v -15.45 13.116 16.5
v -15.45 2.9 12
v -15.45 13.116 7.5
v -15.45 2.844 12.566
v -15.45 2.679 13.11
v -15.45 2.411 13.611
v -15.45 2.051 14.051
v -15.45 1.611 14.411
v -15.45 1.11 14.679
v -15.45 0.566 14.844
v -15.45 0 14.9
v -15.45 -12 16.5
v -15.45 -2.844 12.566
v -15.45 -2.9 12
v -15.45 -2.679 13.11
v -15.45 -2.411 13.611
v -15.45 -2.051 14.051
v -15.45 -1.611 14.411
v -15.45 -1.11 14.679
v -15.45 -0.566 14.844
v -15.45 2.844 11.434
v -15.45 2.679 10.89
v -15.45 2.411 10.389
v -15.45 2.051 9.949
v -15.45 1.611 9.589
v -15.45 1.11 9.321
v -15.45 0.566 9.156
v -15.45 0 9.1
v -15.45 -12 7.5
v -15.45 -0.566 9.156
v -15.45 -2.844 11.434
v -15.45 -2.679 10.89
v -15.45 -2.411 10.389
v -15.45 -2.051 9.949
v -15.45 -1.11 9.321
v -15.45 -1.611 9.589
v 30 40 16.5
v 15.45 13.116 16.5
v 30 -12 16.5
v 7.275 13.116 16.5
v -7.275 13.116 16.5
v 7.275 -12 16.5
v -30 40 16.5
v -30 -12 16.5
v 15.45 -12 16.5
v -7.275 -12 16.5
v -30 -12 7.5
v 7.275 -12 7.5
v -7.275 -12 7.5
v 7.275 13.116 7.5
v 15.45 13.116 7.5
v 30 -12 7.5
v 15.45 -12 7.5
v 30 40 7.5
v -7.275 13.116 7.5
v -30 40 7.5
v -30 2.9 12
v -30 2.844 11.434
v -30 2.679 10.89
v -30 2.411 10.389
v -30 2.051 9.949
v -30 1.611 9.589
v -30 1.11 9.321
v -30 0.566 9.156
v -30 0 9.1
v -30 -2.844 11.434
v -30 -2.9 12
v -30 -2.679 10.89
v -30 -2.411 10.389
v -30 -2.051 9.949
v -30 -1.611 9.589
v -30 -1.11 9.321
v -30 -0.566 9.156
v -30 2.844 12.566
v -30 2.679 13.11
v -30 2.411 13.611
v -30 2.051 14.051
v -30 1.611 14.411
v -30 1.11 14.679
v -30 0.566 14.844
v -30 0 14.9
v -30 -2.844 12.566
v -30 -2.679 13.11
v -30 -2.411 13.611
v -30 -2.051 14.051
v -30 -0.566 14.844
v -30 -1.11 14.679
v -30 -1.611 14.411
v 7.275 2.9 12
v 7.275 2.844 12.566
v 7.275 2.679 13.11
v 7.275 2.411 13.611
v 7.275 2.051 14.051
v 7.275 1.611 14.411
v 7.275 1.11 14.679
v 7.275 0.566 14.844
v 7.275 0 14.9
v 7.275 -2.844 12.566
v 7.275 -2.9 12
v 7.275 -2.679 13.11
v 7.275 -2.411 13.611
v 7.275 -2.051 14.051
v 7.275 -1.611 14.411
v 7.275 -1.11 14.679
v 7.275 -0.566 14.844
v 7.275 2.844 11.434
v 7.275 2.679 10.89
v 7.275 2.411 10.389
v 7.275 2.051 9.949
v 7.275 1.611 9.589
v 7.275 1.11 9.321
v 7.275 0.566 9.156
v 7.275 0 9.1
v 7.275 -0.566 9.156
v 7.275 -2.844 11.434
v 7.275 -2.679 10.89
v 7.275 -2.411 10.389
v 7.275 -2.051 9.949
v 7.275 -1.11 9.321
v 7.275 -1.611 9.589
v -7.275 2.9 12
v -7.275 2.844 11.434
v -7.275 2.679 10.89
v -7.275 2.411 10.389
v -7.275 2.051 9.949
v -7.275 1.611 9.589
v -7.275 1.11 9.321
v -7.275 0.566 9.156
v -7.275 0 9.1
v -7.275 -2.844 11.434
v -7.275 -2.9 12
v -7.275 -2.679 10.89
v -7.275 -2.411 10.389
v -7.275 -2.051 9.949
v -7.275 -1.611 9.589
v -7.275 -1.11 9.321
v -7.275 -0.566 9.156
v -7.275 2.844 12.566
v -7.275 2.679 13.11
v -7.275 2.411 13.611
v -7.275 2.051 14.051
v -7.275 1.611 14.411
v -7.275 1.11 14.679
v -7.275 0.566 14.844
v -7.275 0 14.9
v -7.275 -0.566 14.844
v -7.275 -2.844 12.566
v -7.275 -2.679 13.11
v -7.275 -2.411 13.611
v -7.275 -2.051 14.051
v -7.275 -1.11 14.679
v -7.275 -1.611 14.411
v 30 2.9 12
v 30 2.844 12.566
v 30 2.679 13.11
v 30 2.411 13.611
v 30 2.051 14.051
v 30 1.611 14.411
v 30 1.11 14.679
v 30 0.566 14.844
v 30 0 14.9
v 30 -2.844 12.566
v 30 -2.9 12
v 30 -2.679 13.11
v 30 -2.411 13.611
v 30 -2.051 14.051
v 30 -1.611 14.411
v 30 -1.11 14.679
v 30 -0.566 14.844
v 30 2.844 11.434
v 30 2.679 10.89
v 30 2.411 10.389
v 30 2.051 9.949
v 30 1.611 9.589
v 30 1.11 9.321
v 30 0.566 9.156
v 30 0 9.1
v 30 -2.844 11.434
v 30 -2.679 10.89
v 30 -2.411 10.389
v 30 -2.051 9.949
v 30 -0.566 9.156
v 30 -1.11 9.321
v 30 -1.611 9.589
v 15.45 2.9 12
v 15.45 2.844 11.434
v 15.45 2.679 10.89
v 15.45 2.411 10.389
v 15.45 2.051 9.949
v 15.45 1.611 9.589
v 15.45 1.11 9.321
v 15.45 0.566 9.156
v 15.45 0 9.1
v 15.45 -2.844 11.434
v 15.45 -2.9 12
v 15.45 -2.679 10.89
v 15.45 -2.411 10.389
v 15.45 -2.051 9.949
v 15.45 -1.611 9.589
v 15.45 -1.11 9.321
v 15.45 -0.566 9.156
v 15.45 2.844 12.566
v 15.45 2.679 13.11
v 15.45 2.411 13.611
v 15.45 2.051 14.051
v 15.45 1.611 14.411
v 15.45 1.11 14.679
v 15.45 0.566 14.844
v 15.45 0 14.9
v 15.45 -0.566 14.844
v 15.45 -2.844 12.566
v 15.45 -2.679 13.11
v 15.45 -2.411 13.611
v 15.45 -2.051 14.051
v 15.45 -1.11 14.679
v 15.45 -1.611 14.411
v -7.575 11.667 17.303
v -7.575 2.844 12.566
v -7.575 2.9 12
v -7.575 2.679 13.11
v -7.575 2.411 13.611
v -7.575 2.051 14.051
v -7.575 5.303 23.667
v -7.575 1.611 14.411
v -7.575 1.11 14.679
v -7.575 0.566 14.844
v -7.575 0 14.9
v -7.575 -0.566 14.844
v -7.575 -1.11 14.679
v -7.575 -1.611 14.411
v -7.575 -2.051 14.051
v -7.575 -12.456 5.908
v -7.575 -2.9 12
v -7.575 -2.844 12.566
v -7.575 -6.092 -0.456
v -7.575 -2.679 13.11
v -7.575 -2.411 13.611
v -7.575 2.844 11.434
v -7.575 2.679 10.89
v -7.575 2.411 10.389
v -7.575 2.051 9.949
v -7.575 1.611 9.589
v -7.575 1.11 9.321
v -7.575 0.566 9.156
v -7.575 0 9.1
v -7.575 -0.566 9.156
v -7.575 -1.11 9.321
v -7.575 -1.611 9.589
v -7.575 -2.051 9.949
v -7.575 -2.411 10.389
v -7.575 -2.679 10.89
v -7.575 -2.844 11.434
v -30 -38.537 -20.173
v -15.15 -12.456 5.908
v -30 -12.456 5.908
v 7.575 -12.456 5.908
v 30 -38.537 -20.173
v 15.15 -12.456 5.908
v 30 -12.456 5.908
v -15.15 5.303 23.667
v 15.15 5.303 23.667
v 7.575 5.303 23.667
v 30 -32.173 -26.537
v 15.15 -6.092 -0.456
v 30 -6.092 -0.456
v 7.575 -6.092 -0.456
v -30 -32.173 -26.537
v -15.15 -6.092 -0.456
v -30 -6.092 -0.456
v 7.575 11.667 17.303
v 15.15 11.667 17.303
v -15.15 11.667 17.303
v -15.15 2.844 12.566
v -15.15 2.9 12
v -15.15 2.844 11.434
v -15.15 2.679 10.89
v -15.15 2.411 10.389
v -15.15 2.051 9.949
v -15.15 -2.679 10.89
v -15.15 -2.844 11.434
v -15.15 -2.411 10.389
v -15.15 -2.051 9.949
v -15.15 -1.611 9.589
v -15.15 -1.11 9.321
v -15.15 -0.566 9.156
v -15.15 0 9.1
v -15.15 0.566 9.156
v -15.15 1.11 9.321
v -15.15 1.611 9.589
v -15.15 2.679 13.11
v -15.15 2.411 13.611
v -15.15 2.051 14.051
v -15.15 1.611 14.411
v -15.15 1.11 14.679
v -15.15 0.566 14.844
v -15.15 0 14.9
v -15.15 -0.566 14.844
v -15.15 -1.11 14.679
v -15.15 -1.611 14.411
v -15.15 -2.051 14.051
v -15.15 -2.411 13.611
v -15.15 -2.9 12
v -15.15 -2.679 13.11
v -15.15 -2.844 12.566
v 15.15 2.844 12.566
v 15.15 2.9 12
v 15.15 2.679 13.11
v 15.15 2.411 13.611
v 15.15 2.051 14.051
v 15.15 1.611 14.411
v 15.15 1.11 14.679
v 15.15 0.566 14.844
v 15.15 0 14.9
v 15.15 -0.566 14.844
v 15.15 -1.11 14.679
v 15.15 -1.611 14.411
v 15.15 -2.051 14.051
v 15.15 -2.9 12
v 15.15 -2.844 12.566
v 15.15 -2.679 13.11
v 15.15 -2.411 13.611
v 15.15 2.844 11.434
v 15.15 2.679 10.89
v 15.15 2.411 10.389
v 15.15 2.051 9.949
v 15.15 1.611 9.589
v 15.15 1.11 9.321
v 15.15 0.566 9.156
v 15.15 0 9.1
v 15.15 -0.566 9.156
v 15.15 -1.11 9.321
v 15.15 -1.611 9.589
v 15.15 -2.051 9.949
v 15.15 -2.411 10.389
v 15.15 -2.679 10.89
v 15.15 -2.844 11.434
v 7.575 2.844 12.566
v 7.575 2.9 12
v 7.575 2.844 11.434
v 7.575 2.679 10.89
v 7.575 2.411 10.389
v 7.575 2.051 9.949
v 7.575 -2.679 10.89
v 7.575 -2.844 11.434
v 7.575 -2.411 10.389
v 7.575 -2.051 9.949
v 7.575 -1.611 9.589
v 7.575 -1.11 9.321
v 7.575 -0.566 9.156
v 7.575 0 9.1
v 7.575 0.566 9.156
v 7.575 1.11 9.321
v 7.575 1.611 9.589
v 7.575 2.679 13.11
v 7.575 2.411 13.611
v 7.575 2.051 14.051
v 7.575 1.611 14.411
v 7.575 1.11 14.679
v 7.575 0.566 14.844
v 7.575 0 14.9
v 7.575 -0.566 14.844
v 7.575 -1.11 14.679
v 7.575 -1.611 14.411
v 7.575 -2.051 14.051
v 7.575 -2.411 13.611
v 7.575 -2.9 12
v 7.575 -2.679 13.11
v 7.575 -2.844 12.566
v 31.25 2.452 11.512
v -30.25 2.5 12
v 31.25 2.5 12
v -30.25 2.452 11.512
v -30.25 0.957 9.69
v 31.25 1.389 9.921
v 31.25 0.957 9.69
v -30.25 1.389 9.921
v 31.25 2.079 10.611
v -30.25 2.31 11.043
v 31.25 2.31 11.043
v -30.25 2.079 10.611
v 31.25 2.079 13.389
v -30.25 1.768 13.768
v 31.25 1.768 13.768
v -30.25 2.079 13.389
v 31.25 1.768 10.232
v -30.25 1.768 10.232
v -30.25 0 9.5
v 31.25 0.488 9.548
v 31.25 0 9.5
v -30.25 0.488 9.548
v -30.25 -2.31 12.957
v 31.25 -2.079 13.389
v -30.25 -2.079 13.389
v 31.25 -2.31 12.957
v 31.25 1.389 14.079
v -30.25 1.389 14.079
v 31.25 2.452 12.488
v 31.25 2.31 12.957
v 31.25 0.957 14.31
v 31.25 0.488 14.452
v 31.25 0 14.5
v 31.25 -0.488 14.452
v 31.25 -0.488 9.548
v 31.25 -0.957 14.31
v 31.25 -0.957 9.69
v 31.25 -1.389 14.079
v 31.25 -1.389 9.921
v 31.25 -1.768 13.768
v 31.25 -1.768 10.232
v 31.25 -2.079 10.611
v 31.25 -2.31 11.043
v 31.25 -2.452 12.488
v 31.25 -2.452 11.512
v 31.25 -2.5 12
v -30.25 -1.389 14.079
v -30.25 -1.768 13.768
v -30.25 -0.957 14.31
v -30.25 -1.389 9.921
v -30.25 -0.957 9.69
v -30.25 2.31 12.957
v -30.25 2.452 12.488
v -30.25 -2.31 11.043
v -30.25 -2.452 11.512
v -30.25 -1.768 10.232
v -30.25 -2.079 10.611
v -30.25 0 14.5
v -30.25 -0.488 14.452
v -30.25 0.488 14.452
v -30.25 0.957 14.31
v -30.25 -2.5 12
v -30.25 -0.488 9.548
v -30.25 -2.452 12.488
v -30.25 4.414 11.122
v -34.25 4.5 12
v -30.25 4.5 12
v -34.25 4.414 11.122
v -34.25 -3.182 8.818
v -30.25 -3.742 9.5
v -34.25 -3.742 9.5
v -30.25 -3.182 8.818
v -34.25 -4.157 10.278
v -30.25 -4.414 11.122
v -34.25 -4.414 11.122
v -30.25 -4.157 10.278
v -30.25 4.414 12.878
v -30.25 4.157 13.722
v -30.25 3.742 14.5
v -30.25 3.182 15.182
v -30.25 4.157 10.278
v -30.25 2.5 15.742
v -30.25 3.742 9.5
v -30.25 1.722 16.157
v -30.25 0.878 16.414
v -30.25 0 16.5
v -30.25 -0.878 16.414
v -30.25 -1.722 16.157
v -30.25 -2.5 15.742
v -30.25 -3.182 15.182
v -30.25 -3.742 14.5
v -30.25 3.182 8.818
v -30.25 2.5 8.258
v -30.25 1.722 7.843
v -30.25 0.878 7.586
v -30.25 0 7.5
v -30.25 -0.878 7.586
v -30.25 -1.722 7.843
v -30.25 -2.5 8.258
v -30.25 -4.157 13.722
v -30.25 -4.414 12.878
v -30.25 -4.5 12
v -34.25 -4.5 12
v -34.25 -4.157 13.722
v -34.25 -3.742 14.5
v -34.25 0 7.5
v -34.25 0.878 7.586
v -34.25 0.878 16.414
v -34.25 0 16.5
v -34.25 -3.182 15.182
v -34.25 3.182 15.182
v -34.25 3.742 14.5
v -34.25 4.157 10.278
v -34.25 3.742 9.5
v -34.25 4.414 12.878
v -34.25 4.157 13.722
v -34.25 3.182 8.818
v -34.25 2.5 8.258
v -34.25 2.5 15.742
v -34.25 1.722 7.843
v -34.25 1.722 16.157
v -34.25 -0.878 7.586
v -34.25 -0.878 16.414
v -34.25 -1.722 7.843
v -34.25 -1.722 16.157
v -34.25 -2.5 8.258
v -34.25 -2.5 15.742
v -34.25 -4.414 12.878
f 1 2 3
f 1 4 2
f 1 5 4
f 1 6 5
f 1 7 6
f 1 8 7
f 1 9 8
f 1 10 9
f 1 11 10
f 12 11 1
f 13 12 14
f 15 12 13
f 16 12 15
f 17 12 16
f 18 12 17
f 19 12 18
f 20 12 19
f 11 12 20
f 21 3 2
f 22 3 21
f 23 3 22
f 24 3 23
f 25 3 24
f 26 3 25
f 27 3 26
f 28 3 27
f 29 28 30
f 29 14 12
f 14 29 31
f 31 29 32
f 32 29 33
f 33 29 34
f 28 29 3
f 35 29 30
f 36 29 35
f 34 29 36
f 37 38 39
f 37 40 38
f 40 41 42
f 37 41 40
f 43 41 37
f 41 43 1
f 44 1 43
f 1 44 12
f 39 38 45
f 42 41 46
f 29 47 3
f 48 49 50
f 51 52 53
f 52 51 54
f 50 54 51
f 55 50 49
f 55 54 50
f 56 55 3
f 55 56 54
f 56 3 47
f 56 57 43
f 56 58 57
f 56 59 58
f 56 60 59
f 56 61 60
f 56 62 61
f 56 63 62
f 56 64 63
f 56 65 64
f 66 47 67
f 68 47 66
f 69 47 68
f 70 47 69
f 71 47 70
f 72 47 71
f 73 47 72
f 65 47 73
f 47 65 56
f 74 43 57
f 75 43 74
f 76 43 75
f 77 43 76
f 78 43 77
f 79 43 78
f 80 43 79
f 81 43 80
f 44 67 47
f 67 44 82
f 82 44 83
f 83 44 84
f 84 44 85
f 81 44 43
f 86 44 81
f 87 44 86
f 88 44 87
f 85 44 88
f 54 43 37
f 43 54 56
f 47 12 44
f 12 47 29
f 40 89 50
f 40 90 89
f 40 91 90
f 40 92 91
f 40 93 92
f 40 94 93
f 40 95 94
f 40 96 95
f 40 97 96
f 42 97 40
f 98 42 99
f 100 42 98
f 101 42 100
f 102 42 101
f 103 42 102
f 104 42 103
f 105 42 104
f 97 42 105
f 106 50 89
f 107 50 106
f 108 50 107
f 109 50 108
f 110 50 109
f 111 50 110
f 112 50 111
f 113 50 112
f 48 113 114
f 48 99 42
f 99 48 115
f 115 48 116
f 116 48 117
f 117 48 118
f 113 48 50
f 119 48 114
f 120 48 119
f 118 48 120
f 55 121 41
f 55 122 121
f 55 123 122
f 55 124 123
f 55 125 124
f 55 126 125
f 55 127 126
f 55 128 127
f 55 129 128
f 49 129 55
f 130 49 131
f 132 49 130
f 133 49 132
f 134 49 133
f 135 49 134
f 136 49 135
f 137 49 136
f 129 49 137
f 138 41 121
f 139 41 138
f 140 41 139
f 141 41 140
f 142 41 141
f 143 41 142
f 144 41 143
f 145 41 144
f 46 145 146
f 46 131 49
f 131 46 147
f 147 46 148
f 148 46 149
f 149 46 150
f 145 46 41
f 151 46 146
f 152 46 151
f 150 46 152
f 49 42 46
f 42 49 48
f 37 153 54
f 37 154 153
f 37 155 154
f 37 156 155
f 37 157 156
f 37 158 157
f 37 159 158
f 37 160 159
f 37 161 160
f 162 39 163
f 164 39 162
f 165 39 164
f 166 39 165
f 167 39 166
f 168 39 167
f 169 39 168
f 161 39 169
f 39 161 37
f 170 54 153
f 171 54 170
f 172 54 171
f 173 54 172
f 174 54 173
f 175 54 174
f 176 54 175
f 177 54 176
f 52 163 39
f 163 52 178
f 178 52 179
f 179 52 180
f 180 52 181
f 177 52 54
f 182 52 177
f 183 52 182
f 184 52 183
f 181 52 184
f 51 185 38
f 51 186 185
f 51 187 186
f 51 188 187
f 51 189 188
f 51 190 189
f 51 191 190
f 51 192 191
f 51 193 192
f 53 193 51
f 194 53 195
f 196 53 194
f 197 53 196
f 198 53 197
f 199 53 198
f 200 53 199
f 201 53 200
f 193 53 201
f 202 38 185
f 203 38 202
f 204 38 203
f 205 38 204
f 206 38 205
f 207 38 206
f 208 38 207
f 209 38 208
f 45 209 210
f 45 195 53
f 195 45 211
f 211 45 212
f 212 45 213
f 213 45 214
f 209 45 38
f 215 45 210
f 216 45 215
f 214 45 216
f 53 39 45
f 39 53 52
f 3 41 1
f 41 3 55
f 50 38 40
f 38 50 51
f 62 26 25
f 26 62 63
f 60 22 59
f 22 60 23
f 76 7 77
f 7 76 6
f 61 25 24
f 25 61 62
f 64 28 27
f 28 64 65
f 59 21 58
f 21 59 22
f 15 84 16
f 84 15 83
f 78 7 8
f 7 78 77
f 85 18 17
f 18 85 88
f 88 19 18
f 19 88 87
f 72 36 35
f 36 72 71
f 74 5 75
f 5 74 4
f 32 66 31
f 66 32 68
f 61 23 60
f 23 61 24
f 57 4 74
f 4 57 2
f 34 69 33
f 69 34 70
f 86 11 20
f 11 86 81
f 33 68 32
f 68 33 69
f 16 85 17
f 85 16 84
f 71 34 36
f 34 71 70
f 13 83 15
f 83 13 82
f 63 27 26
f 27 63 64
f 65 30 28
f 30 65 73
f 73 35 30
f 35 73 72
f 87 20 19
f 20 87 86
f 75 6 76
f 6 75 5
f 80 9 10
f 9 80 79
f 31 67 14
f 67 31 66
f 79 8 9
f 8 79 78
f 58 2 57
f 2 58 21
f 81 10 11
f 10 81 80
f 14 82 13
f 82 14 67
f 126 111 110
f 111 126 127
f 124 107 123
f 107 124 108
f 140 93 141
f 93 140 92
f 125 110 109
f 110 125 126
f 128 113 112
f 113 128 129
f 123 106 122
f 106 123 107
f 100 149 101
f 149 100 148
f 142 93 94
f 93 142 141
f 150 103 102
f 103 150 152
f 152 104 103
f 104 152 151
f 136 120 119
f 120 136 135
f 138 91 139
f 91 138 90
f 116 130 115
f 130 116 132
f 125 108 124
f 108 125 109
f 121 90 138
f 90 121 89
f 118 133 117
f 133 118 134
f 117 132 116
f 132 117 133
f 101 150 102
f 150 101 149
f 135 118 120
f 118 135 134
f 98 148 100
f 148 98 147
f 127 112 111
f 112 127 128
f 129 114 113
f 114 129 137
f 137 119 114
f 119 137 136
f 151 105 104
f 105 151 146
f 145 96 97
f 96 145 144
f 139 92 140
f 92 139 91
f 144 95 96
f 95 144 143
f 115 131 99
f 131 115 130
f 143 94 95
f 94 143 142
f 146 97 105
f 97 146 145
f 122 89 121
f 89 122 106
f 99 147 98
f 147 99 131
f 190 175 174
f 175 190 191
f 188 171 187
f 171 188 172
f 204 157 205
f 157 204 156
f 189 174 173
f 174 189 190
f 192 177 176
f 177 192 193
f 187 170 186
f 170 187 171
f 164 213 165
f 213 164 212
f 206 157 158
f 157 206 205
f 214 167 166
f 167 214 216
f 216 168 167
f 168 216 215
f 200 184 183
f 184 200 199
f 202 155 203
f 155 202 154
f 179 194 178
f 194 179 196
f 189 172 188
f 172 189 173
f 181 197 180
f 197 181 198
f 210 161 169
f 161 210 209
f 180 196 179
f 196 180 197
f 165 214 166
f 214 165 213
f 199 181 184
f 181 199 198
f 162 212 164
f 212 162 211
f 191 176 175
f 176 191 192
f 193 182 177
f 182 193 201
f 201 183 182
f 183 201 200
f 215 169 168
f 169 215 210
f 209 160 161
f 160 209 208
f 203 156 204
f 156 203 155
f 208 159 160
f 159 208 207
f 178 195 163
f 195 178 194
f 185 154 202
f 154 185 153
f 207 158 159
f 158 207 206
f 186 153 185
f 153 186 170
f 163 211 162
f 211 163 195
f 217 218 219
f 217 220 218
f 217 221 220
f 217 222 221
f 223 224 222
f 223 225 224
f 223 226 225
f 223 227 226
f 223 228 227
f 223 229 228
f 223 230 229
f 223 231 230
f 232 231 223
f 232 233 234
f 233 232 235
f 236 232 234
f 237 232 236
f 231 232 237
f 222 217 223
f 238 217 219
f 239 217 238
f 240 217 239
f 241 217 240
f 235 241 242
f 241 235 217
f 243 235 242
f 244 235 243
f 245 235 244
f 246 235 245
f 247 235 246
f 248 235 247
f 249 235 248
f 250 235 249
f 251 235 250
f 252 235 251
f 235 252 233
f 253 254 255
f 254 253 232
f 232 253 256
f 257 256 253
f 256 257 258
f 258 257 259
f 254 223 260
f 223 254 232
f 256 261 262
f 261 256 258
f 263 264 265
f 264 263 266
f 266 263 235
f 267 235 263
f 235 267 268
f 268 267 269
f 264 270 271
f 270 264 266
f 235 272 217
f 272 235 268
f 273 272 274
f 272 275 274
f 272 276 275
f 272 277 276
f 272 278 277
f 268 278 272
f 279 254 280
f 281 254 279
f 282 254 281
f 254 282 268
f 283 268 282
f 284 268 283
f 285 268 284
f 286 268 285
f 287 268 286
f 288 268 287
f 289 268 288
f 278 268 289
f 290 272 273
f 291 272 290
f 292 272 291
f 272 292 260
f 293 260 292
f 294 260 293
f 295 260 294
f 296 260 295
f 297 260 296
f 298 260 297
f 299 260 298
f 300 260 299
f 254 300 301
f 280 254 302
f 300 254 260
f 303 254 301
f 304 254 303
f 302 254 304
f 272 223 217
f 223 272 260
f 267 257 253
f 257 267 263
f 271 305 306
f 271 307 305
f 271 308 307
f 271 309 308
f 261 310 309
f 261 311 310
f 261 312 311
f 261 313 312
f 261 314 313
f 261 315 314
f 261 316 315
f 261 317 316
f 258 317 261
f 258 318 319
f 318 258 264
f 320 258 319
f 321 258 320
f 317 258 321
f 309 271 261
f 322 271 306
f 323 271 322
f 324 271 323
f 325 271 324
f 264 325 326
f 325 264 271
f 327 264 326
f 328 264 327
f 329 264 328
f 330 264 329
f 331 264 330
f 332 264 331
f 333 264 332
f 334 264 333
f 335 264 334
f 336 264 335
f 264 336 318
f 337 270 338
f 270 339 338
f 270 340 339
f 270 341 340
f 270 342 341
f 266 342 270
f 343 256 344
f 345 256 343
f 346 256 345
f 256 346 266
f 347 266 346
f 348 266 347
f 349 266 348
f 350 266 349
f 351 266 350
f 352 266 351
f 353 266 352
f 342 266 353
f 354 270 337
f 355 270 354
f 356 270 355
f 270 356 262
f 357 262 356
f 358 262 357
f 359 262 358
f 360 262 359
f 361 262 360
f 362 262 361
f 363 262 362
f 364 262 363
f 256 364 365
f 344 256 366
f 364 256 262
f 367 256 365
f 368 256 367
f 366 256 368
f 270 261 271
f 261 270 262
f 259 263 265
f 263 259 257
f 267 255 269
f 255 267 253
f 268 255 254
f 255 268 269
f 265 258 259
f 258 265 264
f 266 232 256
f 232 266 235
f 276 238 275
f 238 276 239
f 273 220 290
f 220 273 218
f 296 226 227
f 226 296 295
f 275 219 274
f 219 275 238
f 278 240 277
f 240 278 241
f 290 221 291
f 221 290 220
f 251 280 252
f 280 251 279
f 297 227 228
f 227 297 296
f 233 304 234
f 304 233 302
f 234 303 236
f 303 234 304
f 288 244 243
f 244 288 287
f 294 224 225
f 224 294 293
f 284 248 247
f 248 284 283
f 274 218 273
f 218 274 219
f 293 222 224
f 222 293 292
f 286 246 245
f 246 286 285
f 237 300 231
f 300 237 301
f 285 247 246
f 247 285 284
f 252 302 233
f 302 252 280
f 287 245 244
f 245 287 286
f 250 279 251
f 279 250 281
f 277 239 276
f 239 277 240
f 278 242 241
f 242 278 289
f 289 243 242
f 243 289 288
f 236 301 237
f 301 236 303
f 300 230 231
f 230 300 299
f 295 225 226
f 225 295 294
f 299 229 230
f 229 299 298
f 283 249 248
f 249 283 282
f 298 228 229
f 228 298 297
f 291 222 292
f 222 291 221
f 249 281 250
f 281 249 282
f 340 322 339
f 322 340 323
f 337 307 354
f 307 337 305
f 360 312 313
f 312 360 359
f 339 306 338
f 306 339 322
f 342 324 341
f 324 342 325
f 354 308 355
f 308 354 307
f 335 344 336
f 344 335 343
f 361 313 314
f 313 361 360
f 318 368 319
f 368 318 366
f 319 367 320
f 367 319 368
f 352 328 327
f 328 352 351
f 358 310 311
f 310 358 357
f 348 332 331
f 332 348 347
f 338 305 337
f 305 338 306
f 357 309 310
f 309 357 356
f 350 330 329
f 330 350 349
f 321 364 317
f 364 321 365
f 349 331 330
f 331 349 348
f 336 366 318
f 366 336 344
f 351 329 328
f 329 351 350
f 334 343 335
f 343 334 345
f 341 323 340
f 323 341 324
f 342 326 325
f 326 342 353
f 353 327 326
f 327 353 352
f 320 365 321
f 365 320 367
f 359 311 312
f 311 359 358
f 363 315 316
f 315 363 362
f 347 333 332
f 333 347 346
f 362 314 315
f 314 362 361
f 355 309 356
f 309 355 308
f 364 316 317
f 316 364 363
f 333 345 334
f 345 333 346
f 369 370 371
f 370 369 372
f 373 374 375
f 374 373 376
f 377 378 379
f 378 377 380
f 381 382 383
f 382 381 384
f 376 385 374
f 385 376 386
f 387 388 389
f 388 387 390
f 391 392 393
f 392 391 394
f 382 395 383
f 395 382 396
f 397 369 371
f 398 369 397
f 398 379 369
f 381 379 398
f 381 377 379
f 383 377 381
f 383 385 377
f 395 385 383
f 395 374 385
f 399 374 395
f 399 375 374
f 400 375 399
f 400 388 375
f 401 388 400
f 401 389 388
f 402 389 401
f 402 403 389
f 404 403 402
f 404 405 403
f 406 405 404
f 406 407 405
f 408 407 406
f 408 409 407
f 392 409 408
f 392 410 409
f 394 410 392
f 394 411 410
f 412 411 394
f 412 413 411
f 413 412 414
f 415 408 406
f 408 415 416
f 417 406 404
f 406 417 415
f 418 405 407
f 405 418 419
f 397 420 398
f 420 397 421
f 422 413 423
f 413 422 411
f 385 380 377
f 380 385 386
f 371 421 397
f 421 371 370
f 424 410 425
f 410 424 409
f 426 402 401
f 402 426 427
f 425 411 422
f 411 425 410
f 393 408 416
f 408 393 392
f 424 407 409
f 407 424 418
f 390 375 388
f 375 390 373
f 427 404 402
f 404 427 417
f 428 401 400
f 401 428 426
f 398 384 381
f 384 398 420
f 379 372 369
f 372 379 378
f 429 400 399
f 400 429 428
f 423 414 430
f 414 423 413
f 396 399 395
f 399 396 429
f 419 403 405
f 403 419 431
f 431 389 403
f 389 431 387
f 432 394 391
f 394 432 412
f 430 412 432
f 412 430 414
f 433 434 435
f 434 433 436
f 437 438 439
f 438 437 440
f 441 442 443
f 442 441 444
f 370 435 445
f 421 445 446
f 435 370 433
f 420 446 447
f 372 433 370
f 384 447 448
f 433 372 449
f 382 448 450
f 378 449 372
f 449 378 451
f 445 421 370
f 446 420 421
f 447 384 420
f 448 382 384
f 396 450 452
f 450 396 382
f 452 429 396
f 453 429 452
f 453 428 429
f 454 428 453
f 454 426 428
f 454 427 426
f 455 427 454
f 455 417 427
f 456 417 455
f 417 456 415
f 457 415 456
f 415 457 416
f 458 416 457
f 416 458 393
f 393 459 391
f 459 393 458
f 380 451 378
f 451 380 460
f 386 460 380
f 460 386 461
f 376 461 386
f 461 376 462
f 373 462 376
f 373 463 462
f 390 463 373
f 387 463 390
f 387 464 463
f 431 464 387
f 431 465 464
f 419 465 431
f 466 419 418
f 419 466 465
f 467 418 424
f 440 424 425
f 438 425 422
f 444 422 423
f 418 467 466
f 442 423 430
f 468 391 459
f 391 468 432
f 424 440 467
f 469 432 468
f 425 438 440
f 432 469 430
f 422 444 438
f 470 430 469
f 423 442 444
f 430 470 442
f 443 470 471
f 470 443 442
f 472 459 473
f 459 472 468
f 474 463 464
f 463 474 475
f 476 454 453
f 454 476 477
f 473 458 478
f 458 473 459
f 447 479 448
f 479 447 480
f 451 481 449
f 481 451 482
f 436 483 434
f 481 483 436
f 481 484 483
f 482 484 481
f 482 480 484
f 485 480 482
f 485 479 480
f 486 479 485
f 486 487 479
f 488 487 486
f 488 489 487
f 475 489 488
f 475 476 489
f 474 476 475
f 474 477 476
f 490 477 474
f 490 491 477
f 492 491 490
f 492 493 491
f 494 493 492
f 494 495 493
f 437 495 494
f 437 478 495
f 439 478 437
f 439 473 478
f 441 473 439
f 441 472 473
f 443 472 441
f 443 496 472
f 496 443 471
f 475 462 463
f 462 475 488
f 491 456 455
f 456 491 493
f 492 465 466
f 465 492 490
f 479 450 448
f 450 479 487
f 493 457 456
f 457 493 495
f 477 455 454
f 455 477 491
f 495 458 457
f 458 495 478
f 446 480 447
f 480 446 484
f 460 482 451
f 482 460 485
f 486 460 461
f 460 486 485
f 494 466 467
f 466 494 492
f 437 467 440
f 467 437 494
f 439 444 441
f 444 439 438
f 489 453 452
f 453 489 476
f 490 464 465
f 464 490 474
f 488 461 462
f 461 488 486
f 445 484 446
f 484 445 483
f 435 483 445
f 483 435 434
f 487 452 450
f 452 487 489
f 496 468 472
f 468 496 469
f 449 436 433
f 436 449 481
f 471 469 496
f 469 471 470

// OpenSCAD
$fn = 32;

// ------------------------------------------------------------------------
// Butt hinge: hinge 60 mm, leaf swung 45 deg
// Every part is its own module, assembly() places every instance.
// ------------------------------------------------------------------------

// --- part 1 ---
module hinge_base() {
  difference() {
    union() {
      translate([-30, -12, -4.5]) cube([14.55, 52, 9]);
      translate([-7.275, -12, -4.5]) cube([14.55, 52, 9]);
      translate([15.45, -12, -4.5]) cube([14.55, 52, 9]);
      translate([-30, 13.116, -4.5]) cube([60, 26.884, 9]);
    }
    translate([-22.725, 0, 0]) rotate([0, 90, 0]) cylinder(h = 16.55, d = 5.8, center = true);
    translate([0, 0, 0]) rotate([0, 90, 0]) cylinder(h = 16.55, d = 5.8, center = true);
    translate([22.725, 0, 0]) rotate([0, 90, 0]) cylinder(h = 16.55, d = 5.8, center = true);
  }
}

// --- part 2 ---
module hinge_mover() {
  difference() {
    union() {
      translate([-15.15, -50, -4.5]) cube([7.575, 62, 9]);
      translate([7.575, -50, -4.5]) cube([7.575, 62, 9]);
      translate([-30, -50, -4.5]) cube([60, 36.884, 9]);
    }
    translate([-11.362, 0, 0]) rotate([0, 90, 0]) cylinder(h = 9.575, d = 5.8, center = true);
    translate([11.362, 0, 0]) rotate([0, 90, 0]) cylinder(h = 9.575, d = 5.8, center = true);
  }
}

// --- part 3 ---
module hinge_pin() {
  rotate([0, 90, 0]) cylinder(h = 62.5, d = 5, center = true);
  translate([-34.25, 0, 0]) rotate([0, 90, 0]) cylinder(h = 4, d = 9);
}

// --- assembly ---
module assembly() {
  color([0.80, 0.24, 0.20]) translate([0, 0, 12]) rotate([0, 0, 0]) hinge_base();
  color([0.20, 0.45, 0.75]) translate([0, 0, 12]) rotate([45, 0, 0]) hinge_mover();
  color([0.25, 0.62, 0.32]) translate([0, 0, 12]) rotate([0, 0, 0]) hinge_pin();
}

assembly();
